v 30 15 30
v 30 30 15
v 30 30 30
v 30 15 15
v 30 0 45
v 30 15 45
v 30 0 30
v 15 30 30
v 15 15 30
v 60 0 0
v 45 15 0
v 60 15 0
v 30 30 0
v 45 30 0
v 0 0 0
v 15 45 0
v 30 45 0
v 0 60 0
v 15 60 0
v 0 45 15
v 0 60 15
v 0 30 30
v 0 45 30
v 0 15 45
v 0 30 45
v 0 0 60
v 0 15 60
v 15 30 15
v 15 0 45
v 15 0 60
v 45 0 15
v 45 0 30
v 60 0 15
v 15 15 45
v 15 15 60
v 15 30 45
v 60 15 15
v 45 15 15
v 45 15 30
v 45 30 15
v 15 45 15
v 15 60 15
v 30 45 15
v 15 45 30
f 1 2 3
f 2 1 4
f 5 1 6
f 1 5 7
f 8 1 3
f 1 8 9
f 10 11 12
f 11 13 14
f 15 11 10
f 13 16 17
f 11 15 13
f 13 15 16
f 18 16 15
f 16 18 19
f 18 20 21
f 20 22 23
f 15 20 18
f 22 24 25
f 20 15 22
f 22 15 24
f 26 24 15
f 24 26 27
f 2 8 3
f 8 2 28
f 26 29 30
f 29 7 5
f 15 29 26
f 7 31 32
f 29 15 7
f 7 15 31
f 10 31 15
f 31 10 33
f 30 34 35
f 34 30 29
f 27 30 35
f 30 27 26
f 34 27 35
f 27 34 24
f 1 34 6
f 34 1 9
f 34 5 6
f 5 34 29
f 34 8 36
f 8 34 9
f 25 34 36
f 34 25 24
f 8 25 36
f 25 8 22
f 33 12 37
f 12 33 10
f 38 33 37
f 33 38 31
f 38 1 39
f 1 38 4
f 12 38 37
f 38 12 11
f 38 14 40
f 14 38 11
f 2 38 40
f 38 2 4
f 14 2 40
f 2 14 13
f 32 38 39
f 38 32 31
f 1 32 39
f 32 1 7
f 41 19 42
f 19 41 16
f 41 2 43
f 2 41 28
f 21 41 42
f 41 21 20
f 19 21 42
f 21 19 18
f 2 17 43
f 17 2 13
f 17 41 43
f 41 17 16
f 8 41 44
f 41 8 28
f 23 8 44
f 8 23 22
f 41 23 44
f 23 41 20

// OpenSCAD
width = 15;

union() {
    cube(2 * width);

    translate([0, 0, 2 * width])
        cube([width, width, 2 * width]);
    translate([width, 0, 2 * width])
        cube(width);
    translate([0, width, 2 * width])
        cube(width);
    
    translate([2 * width, 0, 0])
        cube([2 * width, width, width]);
    translate([2 * width, width, 0])
        cube(width);
    translate([2 * width, 0, width])
        cube(width);

    translate([0, 2 * width, 0])
        cube([width, 2 * width, width]);
    translate([width, 2 * width, 0])
        cube(width);
    translate([0, 2 * width, width])
        cube(width);
}
